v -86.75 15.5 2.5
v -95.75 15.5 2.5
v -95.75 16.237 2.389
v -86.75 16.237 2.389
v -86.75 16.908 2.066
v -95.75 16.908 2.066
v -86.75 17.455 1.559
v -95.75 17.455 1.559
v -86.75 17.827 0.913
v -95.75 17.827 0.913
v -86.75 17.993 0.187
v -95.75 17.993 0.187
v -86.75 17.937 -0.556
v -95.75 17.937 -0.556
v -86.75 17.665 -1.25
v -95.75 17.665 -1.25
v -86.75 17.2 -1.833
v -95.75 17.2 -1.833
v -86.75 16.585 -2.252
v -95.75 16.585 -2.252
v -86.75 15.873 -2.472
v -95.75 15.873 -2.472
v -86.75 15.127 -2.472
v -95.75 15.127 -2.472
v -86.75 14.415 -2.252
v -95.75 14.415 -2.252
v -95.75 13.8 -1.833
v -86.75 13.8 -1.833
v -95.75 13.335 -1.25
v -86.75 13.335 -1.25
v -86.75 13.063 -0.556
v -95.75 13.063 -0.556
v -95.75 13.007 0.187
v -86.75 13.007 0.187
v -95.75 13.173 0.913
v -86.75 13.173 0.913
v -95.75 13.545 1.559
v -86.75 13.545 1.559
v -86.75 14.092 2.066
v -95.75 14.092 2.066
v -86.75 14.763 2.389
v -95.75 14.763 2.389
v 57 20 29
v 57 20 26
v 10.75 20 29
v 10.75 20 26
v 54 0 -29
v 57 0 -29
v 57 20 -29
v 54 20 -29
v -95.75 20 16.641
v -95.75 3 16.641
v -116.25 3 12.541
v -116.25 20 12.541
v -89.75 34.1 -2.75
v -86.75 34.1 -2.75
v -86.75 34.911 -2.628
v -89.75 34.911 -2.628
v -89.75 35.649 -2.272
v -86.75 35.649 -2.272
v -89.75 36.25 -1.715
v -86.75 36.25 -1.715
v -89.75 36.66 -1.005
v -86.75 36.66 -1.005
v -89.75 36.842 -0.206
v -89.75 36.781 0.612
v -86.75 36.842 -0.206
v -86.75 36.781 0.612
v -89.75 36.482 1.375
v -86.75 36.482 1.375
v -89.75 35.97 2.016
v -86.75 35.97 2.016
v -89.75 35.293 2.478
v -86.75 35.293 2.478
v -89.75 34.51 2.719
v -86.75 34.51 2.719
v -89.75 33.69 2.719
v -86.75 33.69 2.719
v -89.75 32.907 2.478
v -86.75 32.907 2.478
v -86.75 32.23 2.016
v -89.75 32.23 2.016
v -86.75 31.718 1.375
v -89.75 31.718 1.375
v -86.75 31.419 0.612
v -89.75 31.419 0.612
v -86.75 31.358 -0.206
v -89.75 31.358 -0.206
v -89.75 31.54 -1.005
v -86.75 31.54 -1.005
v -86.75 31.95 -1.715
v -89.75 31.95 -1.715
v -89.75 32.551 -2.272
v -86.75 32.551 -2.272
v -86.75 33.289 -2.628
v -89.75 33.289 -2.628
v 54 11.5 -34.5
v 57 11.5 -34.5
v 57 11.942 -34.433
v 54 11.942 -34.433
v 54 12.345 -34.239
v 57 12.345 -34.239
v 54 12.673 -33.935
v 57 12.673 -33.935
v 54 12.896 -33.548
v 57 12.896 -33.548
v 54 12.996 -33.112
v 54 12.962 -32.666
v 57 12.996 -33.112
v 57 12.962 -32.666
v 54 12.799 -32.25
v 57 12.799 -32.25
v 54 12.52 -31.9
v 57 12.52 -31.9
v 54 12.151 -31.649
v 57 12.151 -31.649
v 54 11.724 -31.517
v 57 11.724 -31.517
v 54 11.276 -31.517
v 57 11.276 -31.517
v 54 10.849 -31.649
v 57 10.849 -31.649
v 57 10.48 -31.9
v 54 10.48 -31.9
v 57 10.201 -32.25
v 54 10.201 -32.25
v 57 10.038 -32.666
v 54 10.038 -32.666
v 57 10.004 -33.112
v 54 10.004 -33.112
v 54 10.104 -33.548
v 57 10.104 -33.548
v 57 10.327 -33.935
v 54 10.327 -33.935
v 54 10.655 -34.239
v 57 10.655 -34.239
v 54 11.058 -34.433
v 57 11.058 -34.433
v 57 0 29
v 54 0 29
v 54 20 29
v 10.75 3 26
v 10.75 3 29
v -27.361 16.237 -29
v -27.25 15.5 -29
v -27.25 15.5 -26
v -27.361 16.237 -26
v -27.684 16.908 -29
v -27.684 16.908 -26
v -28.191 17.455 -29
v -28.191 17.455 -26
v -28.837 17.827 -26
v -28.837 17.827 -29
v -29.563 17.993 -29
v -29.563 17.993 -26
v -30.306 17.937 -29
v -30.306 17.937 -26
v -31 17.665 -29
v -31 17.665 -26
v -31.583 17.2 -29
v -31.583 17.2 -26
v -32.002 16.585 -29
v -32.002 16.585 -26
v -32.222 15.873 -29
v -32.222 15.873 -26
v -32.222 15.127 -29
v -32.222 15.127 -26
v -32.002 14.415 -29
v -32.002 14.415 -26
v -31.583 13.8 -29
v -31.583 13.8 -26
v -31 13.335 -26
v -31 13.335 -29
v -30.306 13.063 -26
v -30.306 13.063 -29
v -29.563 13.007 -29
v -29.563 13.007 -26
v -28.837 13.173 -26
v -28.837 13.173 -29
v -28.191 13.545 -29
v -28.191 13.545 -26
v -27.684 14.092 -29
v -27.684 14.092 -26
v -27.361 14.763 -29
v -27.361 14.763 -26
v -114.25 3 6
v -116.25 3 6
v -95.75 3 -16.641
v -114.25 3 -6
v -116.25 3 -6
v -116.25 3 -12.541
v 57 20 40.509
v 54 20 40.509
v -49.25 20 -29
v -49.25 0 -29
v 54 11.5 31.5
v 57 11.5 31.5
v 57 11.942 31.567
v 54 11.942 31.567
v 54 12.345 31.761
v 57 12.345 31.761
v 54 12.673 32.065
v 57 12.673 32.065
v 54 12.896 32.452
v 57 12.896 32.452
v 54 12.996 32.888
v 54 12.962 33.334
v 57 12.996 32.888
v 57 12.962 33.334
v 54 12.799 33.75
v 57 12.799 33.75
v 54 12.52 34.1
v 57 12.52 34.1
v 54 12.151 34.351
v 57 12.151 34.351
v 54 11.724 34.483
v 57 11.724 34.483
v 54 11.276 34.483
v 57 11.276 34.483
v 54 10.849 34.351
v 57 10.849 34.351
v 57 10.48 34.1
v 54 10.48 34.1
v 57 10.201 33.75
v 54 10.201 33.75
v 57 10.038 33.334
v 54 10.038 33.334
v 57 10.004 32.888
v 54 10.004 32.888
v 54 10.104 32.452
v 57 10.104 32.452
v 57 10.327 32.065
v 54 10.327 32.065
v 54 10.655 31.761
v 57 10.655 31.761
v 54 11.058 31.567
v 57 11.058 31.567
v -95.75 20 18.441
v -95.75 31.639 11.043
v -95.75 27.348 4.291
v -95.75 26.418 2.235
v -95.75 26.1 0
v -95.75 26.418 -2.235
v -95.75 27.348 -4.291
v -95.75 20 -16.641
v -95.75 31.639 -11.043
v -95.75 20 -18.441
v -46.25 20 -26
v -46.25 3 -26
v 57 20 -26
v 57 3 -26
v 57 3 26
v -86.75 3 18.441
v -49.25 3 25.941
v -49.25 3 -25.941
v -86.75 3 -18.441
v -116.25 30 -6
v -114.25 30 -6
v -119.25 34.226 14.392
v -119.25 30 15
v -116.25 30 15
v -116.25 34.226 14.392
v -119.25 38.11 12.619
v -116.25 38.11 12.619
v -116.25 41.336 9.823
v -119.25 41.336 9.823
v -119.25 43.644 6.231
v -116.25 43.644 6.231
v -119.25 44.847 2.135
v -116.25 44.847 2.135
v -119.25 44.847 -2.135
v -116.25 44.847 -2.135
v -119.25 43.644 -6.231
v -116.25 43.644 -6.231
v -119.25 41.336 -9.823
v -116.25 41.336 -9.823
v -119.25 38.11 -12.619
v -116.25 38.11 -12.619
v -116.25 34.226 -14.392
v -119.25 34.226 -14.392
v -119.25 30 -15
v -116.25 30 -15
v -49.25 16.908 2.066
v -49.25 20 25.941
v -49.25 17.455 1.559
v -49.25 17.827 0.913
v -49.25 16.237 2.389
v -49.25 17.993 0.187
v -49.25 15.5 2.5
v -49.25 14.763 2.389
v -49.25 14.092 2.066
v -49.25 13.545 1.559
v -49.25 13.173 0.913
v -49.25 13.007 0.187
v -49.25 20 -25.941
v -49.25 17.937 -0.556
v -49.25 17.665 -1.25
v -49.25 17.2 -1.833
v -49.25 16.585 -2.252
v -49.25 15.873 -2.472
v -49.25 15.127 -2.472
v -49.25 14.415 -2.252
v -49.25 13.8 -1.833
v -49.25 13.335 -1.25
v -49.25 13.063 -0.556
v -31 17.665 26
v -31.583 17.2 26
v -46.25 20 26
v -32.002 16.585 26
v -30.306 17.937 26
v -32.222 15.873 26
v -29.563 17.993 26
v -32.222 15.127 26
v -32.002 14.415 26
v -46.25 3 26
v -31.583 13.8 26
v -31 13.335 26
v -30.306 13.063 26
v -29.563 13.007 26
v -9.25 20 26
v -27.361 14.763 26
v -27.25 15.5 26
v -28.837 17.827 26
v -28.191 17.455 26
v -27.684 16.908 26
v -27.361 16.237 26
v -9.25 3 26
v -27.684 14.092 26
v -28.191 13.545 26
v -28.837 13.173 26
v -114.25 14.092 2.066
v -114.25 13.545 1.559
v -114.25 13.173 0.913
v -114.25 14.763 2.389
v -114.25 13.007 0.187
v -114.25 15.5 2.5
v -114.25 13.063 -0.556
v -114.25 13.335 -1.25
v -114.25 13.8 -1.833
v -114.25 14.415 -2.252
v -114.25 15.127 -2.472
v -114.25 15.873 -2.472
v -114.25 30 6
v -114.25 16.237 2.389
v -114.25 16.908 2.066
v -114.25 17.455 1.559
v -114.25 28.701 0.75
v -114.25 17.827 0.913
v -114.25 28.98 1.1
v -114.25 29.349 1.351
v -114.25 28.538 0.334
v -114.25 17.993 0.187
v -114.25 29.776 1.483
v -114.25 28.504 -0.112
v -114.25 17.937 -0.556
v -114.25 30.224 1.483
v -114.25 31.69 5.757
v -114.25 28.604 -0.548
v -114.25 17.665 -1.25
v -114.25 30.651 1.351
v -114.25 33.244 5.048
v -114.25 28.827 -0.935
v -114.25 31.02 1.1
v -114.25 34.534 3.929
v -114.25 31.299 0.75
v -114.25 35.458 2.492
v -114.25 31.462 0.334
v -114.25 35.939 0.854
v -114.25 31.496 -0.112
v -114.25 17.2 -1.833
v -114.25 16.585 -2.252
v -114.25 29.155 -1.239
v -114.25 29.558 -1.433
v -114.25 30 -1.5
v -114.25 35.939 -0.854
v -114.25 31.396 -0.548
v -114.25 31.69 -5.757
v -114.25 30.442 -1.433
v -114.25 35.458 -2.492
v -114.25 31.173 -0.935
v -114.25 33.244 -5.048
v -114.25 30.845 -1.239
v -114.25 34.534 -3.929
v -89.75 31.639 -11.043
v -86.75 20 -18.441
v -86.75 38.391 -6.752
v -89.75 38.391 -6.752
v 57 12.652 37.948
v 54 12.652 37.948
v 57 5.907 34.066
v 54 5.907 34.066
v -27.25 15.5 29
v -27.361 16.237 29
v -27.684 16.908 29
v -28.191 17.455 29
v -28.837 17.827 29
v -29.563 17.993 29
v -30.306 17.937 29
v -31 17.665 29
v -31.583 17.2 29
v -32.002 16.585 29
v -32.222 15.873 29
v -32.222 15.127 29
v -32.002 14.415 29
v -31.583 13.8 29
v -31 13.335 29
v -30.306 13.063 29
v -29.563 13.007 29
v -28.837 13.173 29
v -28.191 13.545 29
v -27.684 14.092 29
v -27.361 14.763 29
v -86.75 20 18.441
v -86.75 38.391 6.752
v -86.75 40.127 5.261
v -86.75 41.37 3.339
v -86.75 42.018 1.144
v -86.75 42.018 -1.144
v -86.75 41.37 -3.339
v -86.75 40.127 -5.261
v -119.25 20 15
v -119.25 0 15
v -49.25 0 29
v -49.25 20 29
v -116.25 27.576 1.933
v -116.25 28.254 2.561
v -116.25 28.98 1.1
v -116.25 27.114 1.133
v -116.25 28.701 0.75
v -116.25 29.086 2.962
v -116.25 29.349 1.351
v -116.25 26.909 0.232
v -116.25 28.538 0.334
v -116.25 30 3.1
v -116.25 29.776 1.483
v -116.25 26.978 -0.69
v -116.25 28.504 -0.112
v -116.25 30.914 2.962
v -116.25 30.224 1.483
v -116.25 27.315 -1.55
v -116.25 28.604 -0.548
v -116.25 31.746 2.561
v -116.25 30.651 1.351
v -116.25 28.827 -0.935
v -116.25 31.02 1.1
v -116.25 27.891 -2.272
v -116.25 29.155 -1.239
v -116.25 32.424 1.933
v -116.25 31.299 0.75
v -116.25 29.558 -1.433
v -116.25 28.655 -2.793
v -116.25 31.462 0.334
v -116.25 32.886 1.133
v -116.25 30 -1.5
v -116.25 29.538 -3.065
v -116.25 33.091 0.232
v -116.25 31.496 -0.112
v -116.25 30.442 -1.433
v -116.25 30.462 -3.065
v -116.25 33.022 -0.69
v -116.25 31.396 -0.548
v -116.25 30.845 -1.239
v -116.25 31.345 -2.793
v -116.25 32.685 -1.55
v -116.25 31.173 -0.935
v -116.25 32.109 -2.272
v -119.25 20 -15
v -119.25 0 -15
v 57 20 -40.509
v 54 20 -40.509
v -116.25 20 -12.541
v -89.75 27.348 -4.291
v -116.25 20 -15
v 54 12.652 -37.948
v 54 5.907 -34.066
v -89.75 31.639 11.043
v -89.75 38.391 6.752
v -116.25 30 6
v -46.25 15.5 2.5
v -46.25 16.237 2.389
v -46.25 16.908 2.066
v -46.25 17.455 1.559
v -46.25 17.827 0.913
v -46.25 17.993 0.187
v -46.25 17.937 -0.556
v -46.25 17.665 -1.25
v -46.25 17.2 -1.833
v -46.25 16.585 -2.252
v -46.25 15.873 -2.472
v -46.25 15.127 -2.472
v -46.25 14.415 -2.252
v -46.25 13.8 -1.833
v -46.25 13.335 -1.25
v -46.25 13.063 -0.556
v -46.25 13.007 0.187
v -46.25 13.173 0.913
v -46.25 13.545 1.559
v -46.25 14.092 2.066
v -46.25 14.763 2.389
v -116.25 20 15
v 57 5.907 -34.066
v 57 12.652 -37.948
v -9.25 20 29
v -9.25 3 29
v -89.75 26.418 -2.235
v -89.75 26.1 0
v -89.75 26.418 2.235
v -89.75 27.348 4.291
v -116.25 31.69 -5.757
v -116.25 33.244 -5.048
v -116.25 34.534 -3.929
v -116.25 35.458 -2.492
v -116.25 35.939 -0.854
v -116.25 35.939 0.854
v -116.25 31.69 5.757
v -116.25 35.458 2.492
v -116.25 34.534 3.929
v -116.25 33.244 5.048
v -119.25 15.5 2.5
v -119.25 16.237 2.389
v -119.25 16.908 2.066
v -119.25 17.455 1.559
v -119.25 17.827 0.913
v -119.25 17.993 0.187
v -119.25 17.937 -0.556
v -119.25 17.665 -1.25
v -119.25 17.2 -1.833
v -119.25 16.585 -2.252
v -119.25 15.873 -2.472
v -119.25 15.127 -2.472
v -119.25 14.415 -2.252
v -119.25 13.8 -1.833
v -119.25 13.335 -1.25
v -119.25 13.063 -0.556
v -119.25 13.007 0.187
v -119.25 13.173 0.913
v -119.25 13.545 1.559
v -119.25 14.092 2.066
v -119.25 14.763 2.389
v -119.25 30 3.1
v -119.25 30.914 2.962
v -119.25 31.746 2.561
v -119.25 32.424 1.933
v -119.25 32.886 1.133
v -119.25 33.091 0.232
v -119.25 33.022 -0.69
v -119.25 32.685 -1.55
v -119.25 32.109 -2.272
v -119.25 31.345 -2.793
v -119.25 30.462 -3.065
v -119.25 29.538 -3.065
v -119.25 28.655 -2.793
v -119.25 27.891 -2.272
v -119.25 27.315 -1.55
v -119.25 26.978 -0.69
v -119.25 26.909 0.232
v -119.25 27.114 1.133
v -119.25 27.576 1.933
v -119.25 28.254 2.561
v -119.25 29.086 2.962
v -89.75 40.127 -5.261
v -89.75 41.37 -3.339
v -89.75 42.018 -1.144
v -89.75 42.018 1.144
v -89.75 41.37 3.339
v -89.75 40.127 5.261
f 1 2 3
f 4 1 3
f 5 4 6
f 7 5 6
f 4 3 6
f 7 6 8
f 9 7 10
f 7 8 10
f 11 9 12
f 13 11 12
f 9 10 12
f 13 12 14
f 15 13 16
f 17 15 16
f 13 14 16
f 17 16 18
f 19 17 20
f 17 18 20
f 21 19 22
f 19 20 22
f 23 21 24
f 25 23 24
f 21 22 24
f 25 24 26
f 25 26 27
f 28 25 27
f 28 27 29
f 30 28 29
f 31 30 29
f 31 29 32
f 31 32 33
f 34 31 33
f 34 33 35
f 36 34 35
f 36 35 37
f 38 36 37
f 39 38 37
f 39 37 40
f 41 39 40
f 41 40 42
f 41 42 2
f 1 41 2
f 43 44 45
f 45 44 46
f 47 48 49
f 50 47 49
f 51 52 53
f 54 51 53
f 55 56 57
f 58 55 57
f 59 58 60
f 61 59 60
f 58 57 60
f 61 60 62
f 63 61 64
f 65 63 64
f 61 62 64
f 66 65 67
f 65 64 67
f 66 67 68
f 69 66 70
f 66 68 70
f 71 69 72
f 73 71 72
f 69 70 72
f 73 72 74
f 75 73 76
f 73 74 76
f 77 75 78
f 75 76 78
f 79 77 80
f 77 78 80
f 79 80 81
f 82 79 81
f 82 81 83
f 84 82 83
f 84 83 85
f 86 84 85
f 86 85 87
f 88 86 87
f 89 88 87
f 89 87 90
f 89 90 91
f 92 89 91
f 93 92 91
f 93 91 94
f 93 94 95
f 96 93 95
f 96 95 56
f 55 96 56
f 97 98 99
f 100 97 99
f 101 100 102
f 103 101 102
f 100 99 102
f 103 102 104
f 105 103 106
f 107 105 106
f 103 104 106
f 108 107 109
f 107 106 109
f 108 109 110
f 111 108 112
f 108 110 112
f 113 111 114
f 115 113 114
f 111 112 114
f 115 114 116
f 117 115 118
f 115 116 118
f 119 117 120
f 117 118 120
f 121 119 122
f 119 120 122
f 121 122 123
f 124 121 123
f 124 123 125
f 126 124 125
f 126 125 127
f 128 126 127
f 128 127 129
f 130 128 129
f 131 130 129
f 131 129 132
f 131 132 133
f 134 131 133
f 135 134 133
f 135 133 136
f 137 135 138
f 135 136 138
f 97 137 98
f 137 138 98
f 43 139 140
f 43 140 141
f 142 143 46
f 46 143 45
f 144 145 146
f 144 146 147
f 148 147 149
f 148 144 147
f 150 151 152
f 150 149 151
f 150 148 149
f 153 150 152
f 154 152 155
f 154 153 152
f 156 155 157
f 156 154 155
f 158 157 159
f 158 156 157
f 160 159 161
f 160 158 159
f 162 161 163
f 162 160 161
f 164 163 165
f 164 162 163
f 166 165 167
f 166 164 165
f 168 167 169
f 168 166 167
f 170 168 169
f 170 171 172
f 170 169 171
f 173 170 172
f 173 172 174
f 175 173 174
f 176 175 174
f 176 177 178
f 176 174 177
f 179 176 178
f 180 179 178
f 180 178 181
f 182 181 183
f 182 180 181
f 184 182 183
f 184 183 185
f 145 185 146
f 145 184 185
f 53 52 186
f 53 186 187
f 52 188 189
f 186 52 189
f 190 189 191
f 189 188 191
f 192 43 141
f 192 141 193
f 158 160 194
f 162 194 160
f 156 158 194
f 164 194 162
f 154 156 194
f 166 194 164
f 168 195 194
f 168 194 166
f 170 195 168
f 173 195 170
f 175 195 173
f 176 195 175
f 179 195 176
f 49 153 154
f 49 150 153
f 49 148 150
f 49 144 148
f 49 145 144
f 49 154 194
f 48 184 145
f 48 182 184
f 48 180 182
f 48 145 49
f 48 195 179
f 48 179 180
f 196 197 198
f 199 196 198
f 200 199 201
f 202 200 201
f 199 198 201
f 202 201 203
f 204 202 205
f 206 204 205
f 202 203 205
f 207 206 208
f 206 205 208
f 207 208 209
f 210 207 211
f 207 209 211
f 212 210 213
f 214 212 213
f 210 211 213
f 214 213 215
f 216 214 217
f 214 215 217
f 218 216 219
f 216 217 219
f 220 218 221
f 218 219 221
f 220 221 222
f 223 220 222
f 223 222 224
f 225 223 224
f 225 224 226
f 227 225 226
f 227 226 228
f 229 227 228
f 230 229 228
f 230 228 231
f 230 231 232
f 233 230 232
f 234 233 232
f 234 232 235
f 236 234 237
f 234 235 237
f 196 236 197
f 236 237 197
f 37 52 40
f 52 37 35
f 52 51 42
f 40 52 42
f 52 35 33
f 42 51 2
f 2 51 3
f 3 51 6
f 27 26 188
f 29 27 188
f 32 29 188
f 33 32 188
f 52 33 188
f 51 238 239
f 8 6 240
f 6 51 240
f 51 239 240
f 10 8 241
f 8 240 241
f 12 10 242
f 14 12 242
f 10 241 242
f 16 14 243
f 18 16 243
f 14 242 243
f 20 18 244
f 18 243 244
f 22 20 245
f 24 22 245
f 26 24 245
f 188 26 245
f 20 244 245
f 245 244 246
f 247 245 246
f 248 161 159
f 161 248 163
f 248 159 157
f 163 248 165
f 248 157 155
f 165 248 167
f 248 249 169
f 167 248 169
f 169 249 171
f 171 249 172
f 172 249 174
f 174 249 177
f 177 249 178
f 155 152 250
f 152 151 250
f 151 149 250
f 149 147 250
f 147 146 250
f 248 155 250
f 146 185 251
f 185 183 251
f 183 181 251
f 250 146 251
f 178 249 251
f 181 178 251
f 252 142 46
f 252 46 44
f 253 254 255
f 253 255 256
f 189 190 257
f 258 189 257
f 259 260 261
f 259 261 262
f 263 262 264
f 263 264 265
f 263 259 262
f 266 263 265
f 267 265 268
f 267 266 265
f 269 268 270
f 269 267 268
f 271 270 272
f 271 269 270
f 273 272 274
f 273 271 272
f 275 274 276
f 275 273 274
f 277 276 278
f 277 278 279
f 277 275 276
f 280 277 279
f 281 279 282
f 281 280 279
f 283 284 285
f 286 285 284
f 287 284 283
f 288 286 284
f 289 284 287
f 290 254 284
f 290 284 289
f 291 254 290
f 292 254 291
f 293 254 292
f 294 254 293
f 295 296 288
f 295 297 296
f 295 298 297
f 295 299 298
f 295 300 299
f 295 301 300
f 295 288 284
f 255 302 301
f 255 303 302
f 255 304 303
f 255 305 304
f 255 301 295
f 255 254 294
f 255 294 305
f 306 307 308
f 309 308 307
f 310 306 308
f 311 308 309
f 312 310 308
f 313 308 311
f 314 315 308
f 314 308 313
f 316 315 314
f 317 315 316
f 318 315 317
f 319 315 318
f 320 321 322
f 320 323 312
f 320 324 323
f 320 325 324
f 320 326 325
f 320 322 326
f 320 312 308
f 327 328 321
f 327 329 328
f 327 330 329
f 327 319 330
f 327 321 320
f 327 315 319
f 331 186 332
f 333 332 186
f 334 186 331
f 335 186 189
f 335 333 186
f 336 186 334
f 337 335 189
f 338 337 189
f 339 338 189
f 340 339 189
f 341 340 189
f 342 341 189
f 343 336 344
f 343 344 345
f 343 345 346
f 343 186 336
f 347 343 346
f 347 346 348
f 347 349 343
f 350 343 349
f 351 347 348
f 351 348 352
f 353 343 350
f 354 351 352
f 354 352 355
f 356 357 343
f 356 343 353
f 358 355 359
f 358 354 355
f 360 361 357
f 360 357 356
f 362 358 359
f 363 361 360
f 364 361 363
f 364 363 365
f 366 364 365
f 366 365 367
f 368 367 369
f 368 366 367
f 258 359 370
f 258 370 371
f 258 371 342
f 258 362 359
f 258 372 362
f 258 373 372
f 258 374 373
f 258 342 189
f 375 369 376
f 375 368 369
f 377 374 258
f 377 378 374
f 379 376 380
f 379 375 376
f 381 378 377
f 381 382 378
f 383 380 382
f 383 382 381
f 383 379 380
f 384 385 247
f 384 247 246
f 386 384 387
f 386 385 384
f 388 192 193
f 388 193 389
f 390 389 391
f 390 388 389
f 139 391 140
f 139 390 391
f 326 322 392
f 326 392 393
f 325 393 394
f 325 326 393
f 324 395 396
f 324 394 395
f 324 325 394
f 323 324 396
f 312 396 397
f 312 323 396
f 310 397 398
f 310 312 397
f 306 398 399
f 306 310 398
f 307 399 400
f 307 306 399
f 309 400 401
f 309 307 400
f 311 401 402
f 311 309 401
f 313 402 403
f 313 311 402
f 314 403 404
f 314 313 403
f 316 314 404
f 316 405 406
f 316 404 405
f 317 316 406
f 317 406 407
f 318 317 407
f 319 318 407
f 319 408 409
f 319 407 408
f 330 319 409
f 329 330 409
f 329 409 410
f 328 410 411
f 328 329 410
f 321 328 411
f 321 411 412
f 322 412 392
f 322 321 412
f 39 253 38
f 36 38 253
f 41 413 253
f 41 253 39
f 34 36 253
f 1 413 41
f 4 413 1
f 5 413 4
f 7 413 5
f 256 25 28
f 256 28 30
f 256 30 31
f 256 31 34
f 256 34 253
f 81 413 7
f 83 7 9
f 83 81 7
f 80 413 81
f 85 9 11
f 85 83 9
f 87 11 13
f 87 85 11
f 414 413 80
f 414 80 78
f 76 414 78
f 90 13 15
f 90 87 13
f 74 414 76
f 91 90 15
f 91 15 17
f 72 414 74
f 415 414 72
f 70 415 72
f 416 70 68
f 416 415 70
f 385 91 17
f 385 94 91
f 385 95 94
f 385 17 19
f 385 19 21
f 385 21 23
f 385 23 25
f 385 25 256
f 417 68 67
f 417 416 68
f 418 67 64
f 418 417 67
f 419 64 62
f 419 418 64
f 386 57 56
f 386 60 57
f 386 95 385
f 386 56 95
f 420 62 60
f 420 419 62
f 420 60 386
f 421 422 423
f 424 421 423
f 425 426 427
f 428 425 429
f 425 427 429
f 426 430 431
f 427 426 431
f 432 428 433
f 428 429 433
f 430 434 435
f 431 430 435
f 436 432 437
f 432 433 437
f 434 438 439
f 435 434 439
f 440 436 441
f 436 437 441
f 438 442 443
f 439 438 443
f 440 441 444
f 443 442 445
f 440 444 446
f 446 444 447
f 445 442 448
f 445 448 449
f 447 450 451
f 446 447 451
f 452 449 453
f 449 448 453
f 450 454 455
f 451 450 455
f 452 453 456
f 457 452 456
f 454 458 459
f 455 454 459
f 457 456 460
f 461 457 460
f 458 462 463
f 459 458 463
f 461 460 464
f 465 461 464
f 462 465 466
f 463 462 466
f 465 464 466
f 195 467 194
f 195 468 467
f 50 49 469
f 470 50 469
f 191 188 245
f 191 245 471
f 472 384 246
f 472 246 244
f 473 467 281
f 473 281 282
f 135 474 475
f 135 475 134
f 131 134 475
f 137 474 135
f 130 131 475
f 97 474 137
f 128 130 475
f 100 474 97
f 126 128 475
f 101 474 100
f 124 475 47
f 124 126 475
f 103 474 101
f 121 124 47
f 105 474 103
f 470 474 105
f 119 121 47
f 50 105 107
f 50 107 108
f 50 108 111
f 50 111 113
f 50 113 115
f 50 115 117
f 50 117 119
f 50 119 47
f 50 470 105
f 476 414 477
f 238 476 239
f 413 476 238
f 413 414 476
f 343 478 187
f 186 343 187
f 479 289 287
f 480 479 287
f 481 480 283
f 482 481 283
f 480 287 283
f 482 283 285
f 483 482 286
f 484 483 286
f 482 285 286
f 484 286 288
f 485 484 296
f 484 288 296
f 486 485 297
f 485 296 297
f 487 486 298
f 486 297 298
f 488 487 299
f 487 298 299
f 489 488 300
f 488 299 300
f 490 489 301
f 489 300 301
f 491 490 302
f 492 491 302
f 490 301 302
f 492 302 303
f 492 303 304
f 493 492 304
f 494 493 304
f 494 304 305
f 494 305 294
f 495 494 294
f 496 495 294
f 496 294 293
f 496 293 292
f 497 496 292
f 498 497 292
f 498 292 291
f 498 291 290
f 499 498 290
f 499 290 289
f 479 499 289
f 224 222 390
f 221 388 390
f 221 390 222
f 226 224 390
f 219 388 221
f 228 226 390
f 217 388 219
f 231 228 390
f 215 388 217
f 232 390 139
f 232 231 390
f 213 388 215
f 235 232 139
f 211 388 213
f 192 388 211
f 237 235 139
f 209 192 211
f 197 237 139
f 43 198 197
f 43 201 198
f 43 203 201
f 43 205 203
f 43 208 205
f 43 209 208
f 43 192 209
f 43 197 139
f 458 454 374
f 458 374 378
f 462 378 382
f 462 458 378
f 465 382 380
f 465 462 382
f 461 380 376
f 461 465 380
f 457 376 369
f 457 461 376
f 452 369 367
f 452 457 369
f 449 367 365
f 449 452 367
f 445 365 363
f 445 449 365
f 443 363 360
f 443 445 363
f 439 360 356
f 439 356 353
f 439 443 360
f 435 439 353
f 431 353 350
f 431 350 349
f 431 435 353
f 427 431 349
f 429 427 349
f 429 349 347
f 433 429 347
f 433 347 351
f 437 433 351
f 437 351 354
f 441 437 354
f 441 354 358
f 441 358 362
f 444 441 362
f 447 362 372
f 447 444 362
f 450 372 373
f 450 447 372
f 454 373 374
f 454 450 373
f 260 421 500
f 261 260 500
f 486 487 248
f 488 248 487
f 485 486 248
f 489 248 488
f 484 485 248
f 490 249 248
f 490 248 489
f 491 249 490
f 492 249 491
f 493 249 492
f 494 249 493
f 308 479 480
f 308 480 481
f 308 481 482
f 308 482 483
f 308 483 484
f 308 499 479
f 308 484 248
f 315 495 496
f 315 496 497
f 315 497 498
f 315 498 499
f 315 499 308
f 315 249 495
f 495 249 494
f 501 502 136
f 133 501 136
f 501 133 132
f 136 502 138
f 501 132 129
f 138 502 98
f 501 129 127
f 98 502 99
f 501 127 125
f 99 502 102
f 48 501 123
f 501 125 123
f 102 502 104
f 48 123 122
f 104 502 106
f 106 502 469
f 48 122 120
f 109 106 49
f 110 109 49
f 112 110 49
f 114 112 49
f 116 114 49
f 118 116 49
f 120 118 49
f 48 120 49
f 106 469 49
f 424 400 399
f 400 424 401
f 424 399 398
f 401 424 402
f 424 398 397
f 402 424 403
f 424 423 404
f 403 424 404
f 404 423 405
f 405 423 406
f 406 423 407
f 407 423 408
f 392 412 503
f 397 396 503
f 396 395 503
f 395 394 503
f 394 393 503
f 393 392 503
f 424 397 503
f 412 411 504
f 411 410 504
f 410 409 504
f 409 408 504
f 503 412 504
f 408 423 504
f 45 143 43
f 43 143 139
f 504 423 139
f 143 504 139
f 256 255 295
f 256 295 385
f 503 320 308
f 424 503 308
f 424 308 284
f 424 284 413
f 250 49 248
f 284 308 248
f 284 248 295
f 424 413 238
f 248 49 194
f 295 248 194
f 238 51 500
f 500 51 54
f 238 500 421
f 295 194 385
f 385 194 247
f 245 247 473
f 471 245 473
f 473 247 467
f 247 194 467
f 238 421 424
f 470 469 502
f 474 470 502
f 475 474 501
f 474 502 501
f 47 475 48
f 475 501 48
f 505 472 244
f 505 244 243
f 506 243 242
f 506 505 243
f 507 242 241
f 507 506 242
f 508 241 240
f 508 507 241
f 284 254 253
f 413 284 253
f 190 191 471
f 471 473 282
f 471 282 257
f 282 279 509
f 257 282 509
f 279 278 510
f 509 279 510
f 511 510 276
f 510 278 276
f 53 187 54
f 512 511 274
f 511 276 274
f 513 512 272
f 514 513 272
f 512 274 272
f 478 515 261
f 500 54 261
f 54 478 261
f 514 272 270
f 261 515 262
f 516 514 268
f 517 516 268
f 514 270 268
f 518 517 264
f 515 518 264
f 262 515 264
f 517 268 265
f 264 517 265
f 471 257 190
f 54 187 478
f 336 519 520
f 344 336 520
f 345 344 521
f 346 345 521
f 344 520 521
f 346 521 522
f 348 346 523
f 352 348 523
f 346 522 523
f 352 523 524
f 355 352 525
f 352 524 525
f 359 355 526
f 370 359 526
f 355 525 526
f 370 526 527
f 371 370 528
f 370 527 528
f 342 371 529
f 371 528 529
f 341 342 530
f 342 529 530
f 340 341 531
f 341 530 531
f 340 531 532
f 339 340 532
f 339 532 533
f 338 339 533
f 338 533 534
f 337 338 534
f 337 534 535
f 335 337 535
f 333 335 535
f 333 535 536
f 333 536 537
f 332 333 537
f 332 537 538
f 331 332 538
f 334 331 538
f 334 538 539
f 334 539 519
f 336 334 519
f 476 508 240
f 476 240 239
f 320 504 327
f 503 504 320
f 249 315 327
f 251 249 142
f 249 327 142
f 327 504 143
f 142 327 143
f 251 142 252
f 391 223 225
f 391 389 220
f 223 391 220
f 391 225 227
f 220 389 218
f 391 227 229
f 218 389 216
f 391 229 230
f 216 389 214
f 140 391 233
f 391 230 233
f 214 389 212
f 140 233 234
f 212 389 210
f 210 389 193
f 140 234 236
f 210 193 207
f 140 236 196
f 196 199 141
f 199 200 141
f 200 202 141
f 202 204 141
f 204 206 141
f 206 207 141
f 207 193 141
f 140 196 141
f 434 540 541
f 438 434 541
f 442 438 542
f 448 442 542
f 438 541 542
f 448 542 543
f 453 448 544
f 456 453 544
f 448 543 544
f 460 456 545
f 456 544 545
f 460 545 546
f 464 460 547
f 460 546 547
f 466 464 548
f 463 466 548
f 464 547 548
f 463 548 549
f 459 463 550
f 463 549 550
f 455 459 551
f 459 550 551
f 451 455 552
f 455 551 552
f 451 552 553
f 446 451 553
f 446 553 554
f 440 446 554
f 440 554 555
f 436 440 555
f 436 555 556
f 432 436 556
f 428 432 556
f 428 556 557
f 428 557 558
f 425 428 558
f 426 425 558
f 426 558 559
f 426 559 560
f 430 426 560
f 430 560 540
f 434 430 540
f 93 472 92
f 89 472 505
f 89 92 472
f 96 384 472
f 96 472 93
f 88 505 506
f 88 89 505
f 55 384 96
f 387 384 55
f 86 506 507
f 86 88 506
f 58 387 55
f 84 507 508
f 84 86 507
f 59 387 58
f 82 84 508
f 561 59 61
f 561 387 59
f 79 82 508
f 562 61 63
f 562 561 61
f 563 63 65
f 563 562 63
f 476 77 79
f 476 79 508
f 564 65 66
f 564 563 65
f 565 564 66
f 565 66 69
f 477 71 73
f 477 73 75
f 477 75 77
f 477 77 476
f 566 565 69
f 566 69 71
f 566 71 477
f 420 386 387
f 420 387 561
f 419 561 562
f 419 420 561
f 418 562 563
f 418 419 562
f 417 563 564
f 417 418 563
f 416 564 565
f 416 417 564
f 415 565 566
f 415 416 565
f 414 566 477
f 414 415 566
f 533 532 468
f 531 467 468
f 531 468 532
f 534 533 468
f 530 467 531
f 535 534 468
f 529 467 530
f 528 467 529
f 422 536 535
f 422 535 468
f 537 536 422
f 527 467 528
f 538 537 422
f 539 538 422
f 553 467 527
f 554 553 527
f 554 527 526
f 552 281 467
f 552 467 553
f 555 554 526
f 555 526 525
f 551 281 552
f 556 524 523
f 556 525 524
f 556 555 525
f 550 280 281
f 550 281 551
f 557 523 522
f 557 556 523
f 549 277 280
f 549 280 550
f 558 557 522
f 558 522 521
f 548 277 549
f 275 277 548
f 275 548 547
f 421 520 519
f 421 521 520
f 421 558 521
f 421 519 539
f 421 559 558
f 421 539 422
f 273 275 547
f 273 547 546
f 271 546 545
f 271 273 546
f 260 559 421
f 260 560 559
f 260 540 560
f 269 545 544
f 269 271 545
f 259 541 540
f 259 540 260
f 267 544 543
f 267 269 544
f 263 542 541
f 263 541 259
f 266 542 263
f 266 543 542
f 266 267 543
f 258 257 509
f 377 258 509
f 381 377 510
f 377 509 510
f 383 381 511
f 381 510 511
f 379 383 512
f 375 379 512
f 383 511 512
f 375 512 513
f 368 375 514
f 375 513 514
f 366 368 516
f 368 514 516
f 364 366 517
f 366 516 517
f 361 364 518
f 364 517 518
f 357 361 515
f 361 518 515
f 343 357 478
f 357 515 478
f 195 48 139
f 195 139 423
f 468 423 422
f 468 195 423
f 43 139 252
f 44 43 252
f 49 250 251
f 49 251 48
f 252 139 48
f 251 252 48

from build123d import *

# Parameters (mm, degrees)
SKETCH2_W               = 106.25
SKETCH2_H               = 58
BOSS_EXTRUDE1_DEPTH     = 3
SKETCH3_W               = 103.25
SKETCH3_H               = 3
BOSS_EXTRUDE2_DEPTH     = 20
SKETCH4_W               = 3
SKETCH4_H               = 30
BOSS_EXTRUDE3_DEPTH     = 30
BOSS_EXTRUDE4_DEPTH     = 17
SKETCH6_R               = 15
BOSS_EXTRUDE5_DEPTH     = 3
CUT_EXTRUDE1_REACH      = 186.201
SKETCH7_R               = 3.1
SKETCH19_R              = 1.5
BOSS_EXTRUDE9_DEPTH     = 2
BOSS_EXTRUDE6_DEPTH     = 17
SKETCH9_R               = 2.5
CUT_EXTRUDE2_DEPTH      = 185.201146848
CUT_EXTRUDE3_DEPTH      = 141.034147621
CUT_EXTRUDE3_DEPTH_BACK = 141.034147621
SKETCH10_R              = 2.5
SKETCH14_R              = 2.75
BOSS_EXTRUDE7_DEPTH     = 9
SKETCH16_R              = 1.5
BOSS_EXTRUDE8_DEPTH     = 3
BOSS_EXTRUDE8_2_DEPTH   = 3
CUT_EXTRUDE4_START      = -6
CUT_EXTRUDE4_DEPTH      = 6
SKETCH18_W              = 20
SKETCH18_H              = 17
CUT_EXTRUDE5_DEPTH      = 3


with BuildPart() as part:
    # Sketch2 → Boss-Extrude1 (new body)
    with BuildSketch(Plane(origin=(0, 0, 0), x_dir=(1, 0, 0), z_dir=(0, 1, 0))):
        Polygon((-119.25, 15), (-49.25, 29), (-49.25, -29), (-119.25, -15), align=None)
        with Locations((3.875, 0)):
            Rectangle(SKETCH2_W, SKETCH2_H)
    extrude(amount=BOSS_EXTRUDE1_DEPTH)

    # Sketch3 → Boss-Extrude2 (add)
    with BuildSketch(Plane.XZ):
        with Locations((5.375, 27.5)):
            Rectangle(SKETCH3_W, SKETCH3_H)
        Polygon((-46.25, 29), (-49.25, 29), (-49.25, 25.940588292), (-49.25, -25.940588292), (-49.25, -29), (-46.25, -29), (-46.25, -26), (-46.25, 26), align=None)
        with Locations((5.375, -27.5)):
            Rectangle(SKETCH3_W, SKETCH3_H)
    extrude(amount=-BOSS_EXTRUDE2_DEPTH)

    # Sketch4 → Boss-Extrude3 (add)
    with BuildSketch(Plane.XZ):
        with Locations((-117.75, 0)):
            Rectangle(SKETCH4_W, SKETCH4_H)
    extrude(amount=-BOSS_EXTRUDE3_DEPTH)

    # Sketch5 → Boss-Extrude4 (add)
    with BuildSketch(Plane(origin=(0, 3, 0), x_dir=(1, 0, 0), z_dir=(0, 1, 0))):
        Polygon((-49.25, 25.940588292), (-116.25, 12.540588292), (-119.25, 15), (-49.25, 29), align=None)
        Polygon((-49.25, -25.940588292), (-116.25, -12.540588292), (-119.25, -15), (-49.25, -29), align=None)
    extrude(amount=BOSS_EXTRUDE4_DEPTH)

    # Sketch6 → Boss-Extrude5 (add)
    with BuildSketch(Plane.ZY.offset(119.25)):
        with Locations((0, 30)):
            Circle(SKETCH6_R)
    extrude(amount=-BOSS_EXTRUDE5_DEPTH)

    # Sketch7 → Cut-Extrude1 (cut, up to next)
    with BuildSketch(Plane.ZY.offset(119.25), mode=Mode.PRIVATE) as cut_extrude1_sk1:
        with Locations((0, 30)):
            Circle(SKETCH7_R)
    cut_extrude1_tool1 = extrude(cut_extrude1_sk1.sketch, amount=-CUT_EXTRUDE1_REACH, mode=Mode.PRIVATE) & part.part
    add(cut_extrude1_tool1.solids().sort_by_distance((-119.25, 30, 0))[0], mode=Mode.SUBTRACT)

    # Sketch19 → Boss-Extrude9 (add)
    with BuildSketch(Plane(origin=(-116.25, 0, 0), x_dir=(0, 0, -1), z_dir=(1, 0, 0))):
        with BuildLine():
            Line((-6, 30), (-6, 0.329020031))
            Line((-6, 0.329020031), (6, 0.329020031))
            Line((6, 0.329020031), (6, 30))
            ThreePointArc((6, 30), (0, 36), (-6, 30))
        make_face()
        with Locations((0, 30)):
            Circle(SKETCH19_R, mode=Mode.SUBTRACT)
    extrude(amount=BOSS_EXTRUDE9_DEPTH)

    # Sketch11 → Boss-Extrude6 (add)
    with BuildSketch(Plane(origin=(0, 3, 0), x_dir=(1, 0, 0), z_dir=(0, 1, 0))):
        Polygon((-86.75, 18.440588292), (-86.75, -18.440588292), (-95.75, -16.640588292), (-95.75, 16.640588292), align=None)
    extrude(amount=BOSS_EXTRUDE6_DEPTH)

    # Sketch9 → Cut-Extrude2 (cut, through all)
    with BuildSketch(Plane.ZY.offset(119.25)):
        with Locations((0, 15.5)):
            Circle(SKETCH9_R)
    extrude(amount=-CUT_EXTRUDE2_DEPTH, mode=Mode.SUBTRACT)

    # Sketch10 → Cut-Extrude3 (cut, two sides: drawn at the far end of the back side and taken through both)
    with BuildSketch(Plane.XY.offset(29).offset(-CUT_EXTRUDE3_DEPTH_BACK)):
        with Locations((-29.75, 15.5)):
            Circle(SKETCH10_R)
    extrude(amount=CUT_EXTRUDE3_DEPTH + CUT_EXTRUDE3_DEPTH_BACK, mode=Mode.SUBTRACT)

    # Sketch14 → Boss-Extrude7 (add)
    with BuildSketch(Plane(origin=(-86.75, 0, 0), x_dir=(0, 0, -1), z_dir=(1, 0, 0))):
        with BuildLine():
            Line((18.440588292, 20), (6.751720823, 38.391184677))
            ThreePointArc((6.751720823, 38.391184677), (0, 42.1), (-6.751720823, 38.391184677))
            Line((-6.751720823, 38.391184677), (-18.440588292, 20))
            Line((-18.440588292, 20), (18.440588292, 20))
        make_face()
        with Locations((0, 34.1)):
            Circle(SKETCH14_R, mode=Mode.SUBTRACT)
    extrude(amount=-BOSS_EXTRUDE7_DEPTH)

    # Sketch17 → Cut-Extrude4 (cut)
    with BuildSketch(Plane.ZY.offset(95.75).offset(CUT_EXTRUDE4_START)):
        with BuildLine():
            Line((4.291184677, 27.348279177), (11.0429055, 31.639463855))
            Line((11.0429055, 31.639463855), (6.751720823, 38.391184677))
            ThreePointArc((6.751720823, 38.391184677), (0, 42.1), (-6.751720823, 38.391184677))
            Line((-6.751720823, 38.391184677), (-11.0429055, 31.639463855))
            Line((-11.0429055, 31.639463855), (-4.291184677, 27.348279177))
            ThreePointArc((-4.291184677, 27.348279177), (0, 26.1), (4.291184677, 27.348279177))
        make_face()
    extrude(amount=CUT_EXTRUDE4_DEPTH, mode=Mode.SUBTRACT)

    # Sketch18 → Cut-Extrude5 (cut)
    with BuildSketch(Plane.XY.offset(29)):
        with Locations((0.75, 11.5)):
            Rectangle(SKETCH18_W, SKETCH18_H)
    extrude(amount=-CUT_EXTRUDE5_DEPTH, mode=Mode.SUBTRACT)


with BuildPart() as body_2:
    # Sketch16 → Boss-Extrude8 (new body)
    with BuildSketch(Plane(origin=(57, 0, 0), x_dir=(0, 0, -1), z_dir=(1, 0, 0))):
        with BuildLine():
            Line((-29, 20), (-40.509258201, 20))
            ThreePointArc((-40.509258201, 20), (-36.164682273, 9.188566698), (-29, 0))
            Line((-29, 0), (-29, 20))
        make_face()
        with Locations((-33, 11.5)):
            Circle(SKETCH16_R, mode=Mode.SUBTRACT)
    extrude(amount=-BOSS_EXTRUDE8_DEPTH)


with BuildPart() as body_3:
    # Sketch16 → Boss-Extrude8 2 (new body)
    with BuildSketch(Plane(origin=(57, 0, 0), x_dir=(0, 0, -1), z_dir=(1, 0, 0))):
        with BuildLine():
            Line((29, 20), (40.509258201, 20))
            ThreePointArc((40.509258201, 20), (36.164682273, 9.188566698), (29, 0))
            Line((29, 0), (29, 20))
        make_face()
        with Locations((33, 11.5)):
            Circle(SKETCH16_R, mode=Mode.SUBTRACT)
    extrude(amount=-BOSS_EXTRUDE8_2_DEPTH)


solid = Compound([part.part, body_2.part, body_3.part])
